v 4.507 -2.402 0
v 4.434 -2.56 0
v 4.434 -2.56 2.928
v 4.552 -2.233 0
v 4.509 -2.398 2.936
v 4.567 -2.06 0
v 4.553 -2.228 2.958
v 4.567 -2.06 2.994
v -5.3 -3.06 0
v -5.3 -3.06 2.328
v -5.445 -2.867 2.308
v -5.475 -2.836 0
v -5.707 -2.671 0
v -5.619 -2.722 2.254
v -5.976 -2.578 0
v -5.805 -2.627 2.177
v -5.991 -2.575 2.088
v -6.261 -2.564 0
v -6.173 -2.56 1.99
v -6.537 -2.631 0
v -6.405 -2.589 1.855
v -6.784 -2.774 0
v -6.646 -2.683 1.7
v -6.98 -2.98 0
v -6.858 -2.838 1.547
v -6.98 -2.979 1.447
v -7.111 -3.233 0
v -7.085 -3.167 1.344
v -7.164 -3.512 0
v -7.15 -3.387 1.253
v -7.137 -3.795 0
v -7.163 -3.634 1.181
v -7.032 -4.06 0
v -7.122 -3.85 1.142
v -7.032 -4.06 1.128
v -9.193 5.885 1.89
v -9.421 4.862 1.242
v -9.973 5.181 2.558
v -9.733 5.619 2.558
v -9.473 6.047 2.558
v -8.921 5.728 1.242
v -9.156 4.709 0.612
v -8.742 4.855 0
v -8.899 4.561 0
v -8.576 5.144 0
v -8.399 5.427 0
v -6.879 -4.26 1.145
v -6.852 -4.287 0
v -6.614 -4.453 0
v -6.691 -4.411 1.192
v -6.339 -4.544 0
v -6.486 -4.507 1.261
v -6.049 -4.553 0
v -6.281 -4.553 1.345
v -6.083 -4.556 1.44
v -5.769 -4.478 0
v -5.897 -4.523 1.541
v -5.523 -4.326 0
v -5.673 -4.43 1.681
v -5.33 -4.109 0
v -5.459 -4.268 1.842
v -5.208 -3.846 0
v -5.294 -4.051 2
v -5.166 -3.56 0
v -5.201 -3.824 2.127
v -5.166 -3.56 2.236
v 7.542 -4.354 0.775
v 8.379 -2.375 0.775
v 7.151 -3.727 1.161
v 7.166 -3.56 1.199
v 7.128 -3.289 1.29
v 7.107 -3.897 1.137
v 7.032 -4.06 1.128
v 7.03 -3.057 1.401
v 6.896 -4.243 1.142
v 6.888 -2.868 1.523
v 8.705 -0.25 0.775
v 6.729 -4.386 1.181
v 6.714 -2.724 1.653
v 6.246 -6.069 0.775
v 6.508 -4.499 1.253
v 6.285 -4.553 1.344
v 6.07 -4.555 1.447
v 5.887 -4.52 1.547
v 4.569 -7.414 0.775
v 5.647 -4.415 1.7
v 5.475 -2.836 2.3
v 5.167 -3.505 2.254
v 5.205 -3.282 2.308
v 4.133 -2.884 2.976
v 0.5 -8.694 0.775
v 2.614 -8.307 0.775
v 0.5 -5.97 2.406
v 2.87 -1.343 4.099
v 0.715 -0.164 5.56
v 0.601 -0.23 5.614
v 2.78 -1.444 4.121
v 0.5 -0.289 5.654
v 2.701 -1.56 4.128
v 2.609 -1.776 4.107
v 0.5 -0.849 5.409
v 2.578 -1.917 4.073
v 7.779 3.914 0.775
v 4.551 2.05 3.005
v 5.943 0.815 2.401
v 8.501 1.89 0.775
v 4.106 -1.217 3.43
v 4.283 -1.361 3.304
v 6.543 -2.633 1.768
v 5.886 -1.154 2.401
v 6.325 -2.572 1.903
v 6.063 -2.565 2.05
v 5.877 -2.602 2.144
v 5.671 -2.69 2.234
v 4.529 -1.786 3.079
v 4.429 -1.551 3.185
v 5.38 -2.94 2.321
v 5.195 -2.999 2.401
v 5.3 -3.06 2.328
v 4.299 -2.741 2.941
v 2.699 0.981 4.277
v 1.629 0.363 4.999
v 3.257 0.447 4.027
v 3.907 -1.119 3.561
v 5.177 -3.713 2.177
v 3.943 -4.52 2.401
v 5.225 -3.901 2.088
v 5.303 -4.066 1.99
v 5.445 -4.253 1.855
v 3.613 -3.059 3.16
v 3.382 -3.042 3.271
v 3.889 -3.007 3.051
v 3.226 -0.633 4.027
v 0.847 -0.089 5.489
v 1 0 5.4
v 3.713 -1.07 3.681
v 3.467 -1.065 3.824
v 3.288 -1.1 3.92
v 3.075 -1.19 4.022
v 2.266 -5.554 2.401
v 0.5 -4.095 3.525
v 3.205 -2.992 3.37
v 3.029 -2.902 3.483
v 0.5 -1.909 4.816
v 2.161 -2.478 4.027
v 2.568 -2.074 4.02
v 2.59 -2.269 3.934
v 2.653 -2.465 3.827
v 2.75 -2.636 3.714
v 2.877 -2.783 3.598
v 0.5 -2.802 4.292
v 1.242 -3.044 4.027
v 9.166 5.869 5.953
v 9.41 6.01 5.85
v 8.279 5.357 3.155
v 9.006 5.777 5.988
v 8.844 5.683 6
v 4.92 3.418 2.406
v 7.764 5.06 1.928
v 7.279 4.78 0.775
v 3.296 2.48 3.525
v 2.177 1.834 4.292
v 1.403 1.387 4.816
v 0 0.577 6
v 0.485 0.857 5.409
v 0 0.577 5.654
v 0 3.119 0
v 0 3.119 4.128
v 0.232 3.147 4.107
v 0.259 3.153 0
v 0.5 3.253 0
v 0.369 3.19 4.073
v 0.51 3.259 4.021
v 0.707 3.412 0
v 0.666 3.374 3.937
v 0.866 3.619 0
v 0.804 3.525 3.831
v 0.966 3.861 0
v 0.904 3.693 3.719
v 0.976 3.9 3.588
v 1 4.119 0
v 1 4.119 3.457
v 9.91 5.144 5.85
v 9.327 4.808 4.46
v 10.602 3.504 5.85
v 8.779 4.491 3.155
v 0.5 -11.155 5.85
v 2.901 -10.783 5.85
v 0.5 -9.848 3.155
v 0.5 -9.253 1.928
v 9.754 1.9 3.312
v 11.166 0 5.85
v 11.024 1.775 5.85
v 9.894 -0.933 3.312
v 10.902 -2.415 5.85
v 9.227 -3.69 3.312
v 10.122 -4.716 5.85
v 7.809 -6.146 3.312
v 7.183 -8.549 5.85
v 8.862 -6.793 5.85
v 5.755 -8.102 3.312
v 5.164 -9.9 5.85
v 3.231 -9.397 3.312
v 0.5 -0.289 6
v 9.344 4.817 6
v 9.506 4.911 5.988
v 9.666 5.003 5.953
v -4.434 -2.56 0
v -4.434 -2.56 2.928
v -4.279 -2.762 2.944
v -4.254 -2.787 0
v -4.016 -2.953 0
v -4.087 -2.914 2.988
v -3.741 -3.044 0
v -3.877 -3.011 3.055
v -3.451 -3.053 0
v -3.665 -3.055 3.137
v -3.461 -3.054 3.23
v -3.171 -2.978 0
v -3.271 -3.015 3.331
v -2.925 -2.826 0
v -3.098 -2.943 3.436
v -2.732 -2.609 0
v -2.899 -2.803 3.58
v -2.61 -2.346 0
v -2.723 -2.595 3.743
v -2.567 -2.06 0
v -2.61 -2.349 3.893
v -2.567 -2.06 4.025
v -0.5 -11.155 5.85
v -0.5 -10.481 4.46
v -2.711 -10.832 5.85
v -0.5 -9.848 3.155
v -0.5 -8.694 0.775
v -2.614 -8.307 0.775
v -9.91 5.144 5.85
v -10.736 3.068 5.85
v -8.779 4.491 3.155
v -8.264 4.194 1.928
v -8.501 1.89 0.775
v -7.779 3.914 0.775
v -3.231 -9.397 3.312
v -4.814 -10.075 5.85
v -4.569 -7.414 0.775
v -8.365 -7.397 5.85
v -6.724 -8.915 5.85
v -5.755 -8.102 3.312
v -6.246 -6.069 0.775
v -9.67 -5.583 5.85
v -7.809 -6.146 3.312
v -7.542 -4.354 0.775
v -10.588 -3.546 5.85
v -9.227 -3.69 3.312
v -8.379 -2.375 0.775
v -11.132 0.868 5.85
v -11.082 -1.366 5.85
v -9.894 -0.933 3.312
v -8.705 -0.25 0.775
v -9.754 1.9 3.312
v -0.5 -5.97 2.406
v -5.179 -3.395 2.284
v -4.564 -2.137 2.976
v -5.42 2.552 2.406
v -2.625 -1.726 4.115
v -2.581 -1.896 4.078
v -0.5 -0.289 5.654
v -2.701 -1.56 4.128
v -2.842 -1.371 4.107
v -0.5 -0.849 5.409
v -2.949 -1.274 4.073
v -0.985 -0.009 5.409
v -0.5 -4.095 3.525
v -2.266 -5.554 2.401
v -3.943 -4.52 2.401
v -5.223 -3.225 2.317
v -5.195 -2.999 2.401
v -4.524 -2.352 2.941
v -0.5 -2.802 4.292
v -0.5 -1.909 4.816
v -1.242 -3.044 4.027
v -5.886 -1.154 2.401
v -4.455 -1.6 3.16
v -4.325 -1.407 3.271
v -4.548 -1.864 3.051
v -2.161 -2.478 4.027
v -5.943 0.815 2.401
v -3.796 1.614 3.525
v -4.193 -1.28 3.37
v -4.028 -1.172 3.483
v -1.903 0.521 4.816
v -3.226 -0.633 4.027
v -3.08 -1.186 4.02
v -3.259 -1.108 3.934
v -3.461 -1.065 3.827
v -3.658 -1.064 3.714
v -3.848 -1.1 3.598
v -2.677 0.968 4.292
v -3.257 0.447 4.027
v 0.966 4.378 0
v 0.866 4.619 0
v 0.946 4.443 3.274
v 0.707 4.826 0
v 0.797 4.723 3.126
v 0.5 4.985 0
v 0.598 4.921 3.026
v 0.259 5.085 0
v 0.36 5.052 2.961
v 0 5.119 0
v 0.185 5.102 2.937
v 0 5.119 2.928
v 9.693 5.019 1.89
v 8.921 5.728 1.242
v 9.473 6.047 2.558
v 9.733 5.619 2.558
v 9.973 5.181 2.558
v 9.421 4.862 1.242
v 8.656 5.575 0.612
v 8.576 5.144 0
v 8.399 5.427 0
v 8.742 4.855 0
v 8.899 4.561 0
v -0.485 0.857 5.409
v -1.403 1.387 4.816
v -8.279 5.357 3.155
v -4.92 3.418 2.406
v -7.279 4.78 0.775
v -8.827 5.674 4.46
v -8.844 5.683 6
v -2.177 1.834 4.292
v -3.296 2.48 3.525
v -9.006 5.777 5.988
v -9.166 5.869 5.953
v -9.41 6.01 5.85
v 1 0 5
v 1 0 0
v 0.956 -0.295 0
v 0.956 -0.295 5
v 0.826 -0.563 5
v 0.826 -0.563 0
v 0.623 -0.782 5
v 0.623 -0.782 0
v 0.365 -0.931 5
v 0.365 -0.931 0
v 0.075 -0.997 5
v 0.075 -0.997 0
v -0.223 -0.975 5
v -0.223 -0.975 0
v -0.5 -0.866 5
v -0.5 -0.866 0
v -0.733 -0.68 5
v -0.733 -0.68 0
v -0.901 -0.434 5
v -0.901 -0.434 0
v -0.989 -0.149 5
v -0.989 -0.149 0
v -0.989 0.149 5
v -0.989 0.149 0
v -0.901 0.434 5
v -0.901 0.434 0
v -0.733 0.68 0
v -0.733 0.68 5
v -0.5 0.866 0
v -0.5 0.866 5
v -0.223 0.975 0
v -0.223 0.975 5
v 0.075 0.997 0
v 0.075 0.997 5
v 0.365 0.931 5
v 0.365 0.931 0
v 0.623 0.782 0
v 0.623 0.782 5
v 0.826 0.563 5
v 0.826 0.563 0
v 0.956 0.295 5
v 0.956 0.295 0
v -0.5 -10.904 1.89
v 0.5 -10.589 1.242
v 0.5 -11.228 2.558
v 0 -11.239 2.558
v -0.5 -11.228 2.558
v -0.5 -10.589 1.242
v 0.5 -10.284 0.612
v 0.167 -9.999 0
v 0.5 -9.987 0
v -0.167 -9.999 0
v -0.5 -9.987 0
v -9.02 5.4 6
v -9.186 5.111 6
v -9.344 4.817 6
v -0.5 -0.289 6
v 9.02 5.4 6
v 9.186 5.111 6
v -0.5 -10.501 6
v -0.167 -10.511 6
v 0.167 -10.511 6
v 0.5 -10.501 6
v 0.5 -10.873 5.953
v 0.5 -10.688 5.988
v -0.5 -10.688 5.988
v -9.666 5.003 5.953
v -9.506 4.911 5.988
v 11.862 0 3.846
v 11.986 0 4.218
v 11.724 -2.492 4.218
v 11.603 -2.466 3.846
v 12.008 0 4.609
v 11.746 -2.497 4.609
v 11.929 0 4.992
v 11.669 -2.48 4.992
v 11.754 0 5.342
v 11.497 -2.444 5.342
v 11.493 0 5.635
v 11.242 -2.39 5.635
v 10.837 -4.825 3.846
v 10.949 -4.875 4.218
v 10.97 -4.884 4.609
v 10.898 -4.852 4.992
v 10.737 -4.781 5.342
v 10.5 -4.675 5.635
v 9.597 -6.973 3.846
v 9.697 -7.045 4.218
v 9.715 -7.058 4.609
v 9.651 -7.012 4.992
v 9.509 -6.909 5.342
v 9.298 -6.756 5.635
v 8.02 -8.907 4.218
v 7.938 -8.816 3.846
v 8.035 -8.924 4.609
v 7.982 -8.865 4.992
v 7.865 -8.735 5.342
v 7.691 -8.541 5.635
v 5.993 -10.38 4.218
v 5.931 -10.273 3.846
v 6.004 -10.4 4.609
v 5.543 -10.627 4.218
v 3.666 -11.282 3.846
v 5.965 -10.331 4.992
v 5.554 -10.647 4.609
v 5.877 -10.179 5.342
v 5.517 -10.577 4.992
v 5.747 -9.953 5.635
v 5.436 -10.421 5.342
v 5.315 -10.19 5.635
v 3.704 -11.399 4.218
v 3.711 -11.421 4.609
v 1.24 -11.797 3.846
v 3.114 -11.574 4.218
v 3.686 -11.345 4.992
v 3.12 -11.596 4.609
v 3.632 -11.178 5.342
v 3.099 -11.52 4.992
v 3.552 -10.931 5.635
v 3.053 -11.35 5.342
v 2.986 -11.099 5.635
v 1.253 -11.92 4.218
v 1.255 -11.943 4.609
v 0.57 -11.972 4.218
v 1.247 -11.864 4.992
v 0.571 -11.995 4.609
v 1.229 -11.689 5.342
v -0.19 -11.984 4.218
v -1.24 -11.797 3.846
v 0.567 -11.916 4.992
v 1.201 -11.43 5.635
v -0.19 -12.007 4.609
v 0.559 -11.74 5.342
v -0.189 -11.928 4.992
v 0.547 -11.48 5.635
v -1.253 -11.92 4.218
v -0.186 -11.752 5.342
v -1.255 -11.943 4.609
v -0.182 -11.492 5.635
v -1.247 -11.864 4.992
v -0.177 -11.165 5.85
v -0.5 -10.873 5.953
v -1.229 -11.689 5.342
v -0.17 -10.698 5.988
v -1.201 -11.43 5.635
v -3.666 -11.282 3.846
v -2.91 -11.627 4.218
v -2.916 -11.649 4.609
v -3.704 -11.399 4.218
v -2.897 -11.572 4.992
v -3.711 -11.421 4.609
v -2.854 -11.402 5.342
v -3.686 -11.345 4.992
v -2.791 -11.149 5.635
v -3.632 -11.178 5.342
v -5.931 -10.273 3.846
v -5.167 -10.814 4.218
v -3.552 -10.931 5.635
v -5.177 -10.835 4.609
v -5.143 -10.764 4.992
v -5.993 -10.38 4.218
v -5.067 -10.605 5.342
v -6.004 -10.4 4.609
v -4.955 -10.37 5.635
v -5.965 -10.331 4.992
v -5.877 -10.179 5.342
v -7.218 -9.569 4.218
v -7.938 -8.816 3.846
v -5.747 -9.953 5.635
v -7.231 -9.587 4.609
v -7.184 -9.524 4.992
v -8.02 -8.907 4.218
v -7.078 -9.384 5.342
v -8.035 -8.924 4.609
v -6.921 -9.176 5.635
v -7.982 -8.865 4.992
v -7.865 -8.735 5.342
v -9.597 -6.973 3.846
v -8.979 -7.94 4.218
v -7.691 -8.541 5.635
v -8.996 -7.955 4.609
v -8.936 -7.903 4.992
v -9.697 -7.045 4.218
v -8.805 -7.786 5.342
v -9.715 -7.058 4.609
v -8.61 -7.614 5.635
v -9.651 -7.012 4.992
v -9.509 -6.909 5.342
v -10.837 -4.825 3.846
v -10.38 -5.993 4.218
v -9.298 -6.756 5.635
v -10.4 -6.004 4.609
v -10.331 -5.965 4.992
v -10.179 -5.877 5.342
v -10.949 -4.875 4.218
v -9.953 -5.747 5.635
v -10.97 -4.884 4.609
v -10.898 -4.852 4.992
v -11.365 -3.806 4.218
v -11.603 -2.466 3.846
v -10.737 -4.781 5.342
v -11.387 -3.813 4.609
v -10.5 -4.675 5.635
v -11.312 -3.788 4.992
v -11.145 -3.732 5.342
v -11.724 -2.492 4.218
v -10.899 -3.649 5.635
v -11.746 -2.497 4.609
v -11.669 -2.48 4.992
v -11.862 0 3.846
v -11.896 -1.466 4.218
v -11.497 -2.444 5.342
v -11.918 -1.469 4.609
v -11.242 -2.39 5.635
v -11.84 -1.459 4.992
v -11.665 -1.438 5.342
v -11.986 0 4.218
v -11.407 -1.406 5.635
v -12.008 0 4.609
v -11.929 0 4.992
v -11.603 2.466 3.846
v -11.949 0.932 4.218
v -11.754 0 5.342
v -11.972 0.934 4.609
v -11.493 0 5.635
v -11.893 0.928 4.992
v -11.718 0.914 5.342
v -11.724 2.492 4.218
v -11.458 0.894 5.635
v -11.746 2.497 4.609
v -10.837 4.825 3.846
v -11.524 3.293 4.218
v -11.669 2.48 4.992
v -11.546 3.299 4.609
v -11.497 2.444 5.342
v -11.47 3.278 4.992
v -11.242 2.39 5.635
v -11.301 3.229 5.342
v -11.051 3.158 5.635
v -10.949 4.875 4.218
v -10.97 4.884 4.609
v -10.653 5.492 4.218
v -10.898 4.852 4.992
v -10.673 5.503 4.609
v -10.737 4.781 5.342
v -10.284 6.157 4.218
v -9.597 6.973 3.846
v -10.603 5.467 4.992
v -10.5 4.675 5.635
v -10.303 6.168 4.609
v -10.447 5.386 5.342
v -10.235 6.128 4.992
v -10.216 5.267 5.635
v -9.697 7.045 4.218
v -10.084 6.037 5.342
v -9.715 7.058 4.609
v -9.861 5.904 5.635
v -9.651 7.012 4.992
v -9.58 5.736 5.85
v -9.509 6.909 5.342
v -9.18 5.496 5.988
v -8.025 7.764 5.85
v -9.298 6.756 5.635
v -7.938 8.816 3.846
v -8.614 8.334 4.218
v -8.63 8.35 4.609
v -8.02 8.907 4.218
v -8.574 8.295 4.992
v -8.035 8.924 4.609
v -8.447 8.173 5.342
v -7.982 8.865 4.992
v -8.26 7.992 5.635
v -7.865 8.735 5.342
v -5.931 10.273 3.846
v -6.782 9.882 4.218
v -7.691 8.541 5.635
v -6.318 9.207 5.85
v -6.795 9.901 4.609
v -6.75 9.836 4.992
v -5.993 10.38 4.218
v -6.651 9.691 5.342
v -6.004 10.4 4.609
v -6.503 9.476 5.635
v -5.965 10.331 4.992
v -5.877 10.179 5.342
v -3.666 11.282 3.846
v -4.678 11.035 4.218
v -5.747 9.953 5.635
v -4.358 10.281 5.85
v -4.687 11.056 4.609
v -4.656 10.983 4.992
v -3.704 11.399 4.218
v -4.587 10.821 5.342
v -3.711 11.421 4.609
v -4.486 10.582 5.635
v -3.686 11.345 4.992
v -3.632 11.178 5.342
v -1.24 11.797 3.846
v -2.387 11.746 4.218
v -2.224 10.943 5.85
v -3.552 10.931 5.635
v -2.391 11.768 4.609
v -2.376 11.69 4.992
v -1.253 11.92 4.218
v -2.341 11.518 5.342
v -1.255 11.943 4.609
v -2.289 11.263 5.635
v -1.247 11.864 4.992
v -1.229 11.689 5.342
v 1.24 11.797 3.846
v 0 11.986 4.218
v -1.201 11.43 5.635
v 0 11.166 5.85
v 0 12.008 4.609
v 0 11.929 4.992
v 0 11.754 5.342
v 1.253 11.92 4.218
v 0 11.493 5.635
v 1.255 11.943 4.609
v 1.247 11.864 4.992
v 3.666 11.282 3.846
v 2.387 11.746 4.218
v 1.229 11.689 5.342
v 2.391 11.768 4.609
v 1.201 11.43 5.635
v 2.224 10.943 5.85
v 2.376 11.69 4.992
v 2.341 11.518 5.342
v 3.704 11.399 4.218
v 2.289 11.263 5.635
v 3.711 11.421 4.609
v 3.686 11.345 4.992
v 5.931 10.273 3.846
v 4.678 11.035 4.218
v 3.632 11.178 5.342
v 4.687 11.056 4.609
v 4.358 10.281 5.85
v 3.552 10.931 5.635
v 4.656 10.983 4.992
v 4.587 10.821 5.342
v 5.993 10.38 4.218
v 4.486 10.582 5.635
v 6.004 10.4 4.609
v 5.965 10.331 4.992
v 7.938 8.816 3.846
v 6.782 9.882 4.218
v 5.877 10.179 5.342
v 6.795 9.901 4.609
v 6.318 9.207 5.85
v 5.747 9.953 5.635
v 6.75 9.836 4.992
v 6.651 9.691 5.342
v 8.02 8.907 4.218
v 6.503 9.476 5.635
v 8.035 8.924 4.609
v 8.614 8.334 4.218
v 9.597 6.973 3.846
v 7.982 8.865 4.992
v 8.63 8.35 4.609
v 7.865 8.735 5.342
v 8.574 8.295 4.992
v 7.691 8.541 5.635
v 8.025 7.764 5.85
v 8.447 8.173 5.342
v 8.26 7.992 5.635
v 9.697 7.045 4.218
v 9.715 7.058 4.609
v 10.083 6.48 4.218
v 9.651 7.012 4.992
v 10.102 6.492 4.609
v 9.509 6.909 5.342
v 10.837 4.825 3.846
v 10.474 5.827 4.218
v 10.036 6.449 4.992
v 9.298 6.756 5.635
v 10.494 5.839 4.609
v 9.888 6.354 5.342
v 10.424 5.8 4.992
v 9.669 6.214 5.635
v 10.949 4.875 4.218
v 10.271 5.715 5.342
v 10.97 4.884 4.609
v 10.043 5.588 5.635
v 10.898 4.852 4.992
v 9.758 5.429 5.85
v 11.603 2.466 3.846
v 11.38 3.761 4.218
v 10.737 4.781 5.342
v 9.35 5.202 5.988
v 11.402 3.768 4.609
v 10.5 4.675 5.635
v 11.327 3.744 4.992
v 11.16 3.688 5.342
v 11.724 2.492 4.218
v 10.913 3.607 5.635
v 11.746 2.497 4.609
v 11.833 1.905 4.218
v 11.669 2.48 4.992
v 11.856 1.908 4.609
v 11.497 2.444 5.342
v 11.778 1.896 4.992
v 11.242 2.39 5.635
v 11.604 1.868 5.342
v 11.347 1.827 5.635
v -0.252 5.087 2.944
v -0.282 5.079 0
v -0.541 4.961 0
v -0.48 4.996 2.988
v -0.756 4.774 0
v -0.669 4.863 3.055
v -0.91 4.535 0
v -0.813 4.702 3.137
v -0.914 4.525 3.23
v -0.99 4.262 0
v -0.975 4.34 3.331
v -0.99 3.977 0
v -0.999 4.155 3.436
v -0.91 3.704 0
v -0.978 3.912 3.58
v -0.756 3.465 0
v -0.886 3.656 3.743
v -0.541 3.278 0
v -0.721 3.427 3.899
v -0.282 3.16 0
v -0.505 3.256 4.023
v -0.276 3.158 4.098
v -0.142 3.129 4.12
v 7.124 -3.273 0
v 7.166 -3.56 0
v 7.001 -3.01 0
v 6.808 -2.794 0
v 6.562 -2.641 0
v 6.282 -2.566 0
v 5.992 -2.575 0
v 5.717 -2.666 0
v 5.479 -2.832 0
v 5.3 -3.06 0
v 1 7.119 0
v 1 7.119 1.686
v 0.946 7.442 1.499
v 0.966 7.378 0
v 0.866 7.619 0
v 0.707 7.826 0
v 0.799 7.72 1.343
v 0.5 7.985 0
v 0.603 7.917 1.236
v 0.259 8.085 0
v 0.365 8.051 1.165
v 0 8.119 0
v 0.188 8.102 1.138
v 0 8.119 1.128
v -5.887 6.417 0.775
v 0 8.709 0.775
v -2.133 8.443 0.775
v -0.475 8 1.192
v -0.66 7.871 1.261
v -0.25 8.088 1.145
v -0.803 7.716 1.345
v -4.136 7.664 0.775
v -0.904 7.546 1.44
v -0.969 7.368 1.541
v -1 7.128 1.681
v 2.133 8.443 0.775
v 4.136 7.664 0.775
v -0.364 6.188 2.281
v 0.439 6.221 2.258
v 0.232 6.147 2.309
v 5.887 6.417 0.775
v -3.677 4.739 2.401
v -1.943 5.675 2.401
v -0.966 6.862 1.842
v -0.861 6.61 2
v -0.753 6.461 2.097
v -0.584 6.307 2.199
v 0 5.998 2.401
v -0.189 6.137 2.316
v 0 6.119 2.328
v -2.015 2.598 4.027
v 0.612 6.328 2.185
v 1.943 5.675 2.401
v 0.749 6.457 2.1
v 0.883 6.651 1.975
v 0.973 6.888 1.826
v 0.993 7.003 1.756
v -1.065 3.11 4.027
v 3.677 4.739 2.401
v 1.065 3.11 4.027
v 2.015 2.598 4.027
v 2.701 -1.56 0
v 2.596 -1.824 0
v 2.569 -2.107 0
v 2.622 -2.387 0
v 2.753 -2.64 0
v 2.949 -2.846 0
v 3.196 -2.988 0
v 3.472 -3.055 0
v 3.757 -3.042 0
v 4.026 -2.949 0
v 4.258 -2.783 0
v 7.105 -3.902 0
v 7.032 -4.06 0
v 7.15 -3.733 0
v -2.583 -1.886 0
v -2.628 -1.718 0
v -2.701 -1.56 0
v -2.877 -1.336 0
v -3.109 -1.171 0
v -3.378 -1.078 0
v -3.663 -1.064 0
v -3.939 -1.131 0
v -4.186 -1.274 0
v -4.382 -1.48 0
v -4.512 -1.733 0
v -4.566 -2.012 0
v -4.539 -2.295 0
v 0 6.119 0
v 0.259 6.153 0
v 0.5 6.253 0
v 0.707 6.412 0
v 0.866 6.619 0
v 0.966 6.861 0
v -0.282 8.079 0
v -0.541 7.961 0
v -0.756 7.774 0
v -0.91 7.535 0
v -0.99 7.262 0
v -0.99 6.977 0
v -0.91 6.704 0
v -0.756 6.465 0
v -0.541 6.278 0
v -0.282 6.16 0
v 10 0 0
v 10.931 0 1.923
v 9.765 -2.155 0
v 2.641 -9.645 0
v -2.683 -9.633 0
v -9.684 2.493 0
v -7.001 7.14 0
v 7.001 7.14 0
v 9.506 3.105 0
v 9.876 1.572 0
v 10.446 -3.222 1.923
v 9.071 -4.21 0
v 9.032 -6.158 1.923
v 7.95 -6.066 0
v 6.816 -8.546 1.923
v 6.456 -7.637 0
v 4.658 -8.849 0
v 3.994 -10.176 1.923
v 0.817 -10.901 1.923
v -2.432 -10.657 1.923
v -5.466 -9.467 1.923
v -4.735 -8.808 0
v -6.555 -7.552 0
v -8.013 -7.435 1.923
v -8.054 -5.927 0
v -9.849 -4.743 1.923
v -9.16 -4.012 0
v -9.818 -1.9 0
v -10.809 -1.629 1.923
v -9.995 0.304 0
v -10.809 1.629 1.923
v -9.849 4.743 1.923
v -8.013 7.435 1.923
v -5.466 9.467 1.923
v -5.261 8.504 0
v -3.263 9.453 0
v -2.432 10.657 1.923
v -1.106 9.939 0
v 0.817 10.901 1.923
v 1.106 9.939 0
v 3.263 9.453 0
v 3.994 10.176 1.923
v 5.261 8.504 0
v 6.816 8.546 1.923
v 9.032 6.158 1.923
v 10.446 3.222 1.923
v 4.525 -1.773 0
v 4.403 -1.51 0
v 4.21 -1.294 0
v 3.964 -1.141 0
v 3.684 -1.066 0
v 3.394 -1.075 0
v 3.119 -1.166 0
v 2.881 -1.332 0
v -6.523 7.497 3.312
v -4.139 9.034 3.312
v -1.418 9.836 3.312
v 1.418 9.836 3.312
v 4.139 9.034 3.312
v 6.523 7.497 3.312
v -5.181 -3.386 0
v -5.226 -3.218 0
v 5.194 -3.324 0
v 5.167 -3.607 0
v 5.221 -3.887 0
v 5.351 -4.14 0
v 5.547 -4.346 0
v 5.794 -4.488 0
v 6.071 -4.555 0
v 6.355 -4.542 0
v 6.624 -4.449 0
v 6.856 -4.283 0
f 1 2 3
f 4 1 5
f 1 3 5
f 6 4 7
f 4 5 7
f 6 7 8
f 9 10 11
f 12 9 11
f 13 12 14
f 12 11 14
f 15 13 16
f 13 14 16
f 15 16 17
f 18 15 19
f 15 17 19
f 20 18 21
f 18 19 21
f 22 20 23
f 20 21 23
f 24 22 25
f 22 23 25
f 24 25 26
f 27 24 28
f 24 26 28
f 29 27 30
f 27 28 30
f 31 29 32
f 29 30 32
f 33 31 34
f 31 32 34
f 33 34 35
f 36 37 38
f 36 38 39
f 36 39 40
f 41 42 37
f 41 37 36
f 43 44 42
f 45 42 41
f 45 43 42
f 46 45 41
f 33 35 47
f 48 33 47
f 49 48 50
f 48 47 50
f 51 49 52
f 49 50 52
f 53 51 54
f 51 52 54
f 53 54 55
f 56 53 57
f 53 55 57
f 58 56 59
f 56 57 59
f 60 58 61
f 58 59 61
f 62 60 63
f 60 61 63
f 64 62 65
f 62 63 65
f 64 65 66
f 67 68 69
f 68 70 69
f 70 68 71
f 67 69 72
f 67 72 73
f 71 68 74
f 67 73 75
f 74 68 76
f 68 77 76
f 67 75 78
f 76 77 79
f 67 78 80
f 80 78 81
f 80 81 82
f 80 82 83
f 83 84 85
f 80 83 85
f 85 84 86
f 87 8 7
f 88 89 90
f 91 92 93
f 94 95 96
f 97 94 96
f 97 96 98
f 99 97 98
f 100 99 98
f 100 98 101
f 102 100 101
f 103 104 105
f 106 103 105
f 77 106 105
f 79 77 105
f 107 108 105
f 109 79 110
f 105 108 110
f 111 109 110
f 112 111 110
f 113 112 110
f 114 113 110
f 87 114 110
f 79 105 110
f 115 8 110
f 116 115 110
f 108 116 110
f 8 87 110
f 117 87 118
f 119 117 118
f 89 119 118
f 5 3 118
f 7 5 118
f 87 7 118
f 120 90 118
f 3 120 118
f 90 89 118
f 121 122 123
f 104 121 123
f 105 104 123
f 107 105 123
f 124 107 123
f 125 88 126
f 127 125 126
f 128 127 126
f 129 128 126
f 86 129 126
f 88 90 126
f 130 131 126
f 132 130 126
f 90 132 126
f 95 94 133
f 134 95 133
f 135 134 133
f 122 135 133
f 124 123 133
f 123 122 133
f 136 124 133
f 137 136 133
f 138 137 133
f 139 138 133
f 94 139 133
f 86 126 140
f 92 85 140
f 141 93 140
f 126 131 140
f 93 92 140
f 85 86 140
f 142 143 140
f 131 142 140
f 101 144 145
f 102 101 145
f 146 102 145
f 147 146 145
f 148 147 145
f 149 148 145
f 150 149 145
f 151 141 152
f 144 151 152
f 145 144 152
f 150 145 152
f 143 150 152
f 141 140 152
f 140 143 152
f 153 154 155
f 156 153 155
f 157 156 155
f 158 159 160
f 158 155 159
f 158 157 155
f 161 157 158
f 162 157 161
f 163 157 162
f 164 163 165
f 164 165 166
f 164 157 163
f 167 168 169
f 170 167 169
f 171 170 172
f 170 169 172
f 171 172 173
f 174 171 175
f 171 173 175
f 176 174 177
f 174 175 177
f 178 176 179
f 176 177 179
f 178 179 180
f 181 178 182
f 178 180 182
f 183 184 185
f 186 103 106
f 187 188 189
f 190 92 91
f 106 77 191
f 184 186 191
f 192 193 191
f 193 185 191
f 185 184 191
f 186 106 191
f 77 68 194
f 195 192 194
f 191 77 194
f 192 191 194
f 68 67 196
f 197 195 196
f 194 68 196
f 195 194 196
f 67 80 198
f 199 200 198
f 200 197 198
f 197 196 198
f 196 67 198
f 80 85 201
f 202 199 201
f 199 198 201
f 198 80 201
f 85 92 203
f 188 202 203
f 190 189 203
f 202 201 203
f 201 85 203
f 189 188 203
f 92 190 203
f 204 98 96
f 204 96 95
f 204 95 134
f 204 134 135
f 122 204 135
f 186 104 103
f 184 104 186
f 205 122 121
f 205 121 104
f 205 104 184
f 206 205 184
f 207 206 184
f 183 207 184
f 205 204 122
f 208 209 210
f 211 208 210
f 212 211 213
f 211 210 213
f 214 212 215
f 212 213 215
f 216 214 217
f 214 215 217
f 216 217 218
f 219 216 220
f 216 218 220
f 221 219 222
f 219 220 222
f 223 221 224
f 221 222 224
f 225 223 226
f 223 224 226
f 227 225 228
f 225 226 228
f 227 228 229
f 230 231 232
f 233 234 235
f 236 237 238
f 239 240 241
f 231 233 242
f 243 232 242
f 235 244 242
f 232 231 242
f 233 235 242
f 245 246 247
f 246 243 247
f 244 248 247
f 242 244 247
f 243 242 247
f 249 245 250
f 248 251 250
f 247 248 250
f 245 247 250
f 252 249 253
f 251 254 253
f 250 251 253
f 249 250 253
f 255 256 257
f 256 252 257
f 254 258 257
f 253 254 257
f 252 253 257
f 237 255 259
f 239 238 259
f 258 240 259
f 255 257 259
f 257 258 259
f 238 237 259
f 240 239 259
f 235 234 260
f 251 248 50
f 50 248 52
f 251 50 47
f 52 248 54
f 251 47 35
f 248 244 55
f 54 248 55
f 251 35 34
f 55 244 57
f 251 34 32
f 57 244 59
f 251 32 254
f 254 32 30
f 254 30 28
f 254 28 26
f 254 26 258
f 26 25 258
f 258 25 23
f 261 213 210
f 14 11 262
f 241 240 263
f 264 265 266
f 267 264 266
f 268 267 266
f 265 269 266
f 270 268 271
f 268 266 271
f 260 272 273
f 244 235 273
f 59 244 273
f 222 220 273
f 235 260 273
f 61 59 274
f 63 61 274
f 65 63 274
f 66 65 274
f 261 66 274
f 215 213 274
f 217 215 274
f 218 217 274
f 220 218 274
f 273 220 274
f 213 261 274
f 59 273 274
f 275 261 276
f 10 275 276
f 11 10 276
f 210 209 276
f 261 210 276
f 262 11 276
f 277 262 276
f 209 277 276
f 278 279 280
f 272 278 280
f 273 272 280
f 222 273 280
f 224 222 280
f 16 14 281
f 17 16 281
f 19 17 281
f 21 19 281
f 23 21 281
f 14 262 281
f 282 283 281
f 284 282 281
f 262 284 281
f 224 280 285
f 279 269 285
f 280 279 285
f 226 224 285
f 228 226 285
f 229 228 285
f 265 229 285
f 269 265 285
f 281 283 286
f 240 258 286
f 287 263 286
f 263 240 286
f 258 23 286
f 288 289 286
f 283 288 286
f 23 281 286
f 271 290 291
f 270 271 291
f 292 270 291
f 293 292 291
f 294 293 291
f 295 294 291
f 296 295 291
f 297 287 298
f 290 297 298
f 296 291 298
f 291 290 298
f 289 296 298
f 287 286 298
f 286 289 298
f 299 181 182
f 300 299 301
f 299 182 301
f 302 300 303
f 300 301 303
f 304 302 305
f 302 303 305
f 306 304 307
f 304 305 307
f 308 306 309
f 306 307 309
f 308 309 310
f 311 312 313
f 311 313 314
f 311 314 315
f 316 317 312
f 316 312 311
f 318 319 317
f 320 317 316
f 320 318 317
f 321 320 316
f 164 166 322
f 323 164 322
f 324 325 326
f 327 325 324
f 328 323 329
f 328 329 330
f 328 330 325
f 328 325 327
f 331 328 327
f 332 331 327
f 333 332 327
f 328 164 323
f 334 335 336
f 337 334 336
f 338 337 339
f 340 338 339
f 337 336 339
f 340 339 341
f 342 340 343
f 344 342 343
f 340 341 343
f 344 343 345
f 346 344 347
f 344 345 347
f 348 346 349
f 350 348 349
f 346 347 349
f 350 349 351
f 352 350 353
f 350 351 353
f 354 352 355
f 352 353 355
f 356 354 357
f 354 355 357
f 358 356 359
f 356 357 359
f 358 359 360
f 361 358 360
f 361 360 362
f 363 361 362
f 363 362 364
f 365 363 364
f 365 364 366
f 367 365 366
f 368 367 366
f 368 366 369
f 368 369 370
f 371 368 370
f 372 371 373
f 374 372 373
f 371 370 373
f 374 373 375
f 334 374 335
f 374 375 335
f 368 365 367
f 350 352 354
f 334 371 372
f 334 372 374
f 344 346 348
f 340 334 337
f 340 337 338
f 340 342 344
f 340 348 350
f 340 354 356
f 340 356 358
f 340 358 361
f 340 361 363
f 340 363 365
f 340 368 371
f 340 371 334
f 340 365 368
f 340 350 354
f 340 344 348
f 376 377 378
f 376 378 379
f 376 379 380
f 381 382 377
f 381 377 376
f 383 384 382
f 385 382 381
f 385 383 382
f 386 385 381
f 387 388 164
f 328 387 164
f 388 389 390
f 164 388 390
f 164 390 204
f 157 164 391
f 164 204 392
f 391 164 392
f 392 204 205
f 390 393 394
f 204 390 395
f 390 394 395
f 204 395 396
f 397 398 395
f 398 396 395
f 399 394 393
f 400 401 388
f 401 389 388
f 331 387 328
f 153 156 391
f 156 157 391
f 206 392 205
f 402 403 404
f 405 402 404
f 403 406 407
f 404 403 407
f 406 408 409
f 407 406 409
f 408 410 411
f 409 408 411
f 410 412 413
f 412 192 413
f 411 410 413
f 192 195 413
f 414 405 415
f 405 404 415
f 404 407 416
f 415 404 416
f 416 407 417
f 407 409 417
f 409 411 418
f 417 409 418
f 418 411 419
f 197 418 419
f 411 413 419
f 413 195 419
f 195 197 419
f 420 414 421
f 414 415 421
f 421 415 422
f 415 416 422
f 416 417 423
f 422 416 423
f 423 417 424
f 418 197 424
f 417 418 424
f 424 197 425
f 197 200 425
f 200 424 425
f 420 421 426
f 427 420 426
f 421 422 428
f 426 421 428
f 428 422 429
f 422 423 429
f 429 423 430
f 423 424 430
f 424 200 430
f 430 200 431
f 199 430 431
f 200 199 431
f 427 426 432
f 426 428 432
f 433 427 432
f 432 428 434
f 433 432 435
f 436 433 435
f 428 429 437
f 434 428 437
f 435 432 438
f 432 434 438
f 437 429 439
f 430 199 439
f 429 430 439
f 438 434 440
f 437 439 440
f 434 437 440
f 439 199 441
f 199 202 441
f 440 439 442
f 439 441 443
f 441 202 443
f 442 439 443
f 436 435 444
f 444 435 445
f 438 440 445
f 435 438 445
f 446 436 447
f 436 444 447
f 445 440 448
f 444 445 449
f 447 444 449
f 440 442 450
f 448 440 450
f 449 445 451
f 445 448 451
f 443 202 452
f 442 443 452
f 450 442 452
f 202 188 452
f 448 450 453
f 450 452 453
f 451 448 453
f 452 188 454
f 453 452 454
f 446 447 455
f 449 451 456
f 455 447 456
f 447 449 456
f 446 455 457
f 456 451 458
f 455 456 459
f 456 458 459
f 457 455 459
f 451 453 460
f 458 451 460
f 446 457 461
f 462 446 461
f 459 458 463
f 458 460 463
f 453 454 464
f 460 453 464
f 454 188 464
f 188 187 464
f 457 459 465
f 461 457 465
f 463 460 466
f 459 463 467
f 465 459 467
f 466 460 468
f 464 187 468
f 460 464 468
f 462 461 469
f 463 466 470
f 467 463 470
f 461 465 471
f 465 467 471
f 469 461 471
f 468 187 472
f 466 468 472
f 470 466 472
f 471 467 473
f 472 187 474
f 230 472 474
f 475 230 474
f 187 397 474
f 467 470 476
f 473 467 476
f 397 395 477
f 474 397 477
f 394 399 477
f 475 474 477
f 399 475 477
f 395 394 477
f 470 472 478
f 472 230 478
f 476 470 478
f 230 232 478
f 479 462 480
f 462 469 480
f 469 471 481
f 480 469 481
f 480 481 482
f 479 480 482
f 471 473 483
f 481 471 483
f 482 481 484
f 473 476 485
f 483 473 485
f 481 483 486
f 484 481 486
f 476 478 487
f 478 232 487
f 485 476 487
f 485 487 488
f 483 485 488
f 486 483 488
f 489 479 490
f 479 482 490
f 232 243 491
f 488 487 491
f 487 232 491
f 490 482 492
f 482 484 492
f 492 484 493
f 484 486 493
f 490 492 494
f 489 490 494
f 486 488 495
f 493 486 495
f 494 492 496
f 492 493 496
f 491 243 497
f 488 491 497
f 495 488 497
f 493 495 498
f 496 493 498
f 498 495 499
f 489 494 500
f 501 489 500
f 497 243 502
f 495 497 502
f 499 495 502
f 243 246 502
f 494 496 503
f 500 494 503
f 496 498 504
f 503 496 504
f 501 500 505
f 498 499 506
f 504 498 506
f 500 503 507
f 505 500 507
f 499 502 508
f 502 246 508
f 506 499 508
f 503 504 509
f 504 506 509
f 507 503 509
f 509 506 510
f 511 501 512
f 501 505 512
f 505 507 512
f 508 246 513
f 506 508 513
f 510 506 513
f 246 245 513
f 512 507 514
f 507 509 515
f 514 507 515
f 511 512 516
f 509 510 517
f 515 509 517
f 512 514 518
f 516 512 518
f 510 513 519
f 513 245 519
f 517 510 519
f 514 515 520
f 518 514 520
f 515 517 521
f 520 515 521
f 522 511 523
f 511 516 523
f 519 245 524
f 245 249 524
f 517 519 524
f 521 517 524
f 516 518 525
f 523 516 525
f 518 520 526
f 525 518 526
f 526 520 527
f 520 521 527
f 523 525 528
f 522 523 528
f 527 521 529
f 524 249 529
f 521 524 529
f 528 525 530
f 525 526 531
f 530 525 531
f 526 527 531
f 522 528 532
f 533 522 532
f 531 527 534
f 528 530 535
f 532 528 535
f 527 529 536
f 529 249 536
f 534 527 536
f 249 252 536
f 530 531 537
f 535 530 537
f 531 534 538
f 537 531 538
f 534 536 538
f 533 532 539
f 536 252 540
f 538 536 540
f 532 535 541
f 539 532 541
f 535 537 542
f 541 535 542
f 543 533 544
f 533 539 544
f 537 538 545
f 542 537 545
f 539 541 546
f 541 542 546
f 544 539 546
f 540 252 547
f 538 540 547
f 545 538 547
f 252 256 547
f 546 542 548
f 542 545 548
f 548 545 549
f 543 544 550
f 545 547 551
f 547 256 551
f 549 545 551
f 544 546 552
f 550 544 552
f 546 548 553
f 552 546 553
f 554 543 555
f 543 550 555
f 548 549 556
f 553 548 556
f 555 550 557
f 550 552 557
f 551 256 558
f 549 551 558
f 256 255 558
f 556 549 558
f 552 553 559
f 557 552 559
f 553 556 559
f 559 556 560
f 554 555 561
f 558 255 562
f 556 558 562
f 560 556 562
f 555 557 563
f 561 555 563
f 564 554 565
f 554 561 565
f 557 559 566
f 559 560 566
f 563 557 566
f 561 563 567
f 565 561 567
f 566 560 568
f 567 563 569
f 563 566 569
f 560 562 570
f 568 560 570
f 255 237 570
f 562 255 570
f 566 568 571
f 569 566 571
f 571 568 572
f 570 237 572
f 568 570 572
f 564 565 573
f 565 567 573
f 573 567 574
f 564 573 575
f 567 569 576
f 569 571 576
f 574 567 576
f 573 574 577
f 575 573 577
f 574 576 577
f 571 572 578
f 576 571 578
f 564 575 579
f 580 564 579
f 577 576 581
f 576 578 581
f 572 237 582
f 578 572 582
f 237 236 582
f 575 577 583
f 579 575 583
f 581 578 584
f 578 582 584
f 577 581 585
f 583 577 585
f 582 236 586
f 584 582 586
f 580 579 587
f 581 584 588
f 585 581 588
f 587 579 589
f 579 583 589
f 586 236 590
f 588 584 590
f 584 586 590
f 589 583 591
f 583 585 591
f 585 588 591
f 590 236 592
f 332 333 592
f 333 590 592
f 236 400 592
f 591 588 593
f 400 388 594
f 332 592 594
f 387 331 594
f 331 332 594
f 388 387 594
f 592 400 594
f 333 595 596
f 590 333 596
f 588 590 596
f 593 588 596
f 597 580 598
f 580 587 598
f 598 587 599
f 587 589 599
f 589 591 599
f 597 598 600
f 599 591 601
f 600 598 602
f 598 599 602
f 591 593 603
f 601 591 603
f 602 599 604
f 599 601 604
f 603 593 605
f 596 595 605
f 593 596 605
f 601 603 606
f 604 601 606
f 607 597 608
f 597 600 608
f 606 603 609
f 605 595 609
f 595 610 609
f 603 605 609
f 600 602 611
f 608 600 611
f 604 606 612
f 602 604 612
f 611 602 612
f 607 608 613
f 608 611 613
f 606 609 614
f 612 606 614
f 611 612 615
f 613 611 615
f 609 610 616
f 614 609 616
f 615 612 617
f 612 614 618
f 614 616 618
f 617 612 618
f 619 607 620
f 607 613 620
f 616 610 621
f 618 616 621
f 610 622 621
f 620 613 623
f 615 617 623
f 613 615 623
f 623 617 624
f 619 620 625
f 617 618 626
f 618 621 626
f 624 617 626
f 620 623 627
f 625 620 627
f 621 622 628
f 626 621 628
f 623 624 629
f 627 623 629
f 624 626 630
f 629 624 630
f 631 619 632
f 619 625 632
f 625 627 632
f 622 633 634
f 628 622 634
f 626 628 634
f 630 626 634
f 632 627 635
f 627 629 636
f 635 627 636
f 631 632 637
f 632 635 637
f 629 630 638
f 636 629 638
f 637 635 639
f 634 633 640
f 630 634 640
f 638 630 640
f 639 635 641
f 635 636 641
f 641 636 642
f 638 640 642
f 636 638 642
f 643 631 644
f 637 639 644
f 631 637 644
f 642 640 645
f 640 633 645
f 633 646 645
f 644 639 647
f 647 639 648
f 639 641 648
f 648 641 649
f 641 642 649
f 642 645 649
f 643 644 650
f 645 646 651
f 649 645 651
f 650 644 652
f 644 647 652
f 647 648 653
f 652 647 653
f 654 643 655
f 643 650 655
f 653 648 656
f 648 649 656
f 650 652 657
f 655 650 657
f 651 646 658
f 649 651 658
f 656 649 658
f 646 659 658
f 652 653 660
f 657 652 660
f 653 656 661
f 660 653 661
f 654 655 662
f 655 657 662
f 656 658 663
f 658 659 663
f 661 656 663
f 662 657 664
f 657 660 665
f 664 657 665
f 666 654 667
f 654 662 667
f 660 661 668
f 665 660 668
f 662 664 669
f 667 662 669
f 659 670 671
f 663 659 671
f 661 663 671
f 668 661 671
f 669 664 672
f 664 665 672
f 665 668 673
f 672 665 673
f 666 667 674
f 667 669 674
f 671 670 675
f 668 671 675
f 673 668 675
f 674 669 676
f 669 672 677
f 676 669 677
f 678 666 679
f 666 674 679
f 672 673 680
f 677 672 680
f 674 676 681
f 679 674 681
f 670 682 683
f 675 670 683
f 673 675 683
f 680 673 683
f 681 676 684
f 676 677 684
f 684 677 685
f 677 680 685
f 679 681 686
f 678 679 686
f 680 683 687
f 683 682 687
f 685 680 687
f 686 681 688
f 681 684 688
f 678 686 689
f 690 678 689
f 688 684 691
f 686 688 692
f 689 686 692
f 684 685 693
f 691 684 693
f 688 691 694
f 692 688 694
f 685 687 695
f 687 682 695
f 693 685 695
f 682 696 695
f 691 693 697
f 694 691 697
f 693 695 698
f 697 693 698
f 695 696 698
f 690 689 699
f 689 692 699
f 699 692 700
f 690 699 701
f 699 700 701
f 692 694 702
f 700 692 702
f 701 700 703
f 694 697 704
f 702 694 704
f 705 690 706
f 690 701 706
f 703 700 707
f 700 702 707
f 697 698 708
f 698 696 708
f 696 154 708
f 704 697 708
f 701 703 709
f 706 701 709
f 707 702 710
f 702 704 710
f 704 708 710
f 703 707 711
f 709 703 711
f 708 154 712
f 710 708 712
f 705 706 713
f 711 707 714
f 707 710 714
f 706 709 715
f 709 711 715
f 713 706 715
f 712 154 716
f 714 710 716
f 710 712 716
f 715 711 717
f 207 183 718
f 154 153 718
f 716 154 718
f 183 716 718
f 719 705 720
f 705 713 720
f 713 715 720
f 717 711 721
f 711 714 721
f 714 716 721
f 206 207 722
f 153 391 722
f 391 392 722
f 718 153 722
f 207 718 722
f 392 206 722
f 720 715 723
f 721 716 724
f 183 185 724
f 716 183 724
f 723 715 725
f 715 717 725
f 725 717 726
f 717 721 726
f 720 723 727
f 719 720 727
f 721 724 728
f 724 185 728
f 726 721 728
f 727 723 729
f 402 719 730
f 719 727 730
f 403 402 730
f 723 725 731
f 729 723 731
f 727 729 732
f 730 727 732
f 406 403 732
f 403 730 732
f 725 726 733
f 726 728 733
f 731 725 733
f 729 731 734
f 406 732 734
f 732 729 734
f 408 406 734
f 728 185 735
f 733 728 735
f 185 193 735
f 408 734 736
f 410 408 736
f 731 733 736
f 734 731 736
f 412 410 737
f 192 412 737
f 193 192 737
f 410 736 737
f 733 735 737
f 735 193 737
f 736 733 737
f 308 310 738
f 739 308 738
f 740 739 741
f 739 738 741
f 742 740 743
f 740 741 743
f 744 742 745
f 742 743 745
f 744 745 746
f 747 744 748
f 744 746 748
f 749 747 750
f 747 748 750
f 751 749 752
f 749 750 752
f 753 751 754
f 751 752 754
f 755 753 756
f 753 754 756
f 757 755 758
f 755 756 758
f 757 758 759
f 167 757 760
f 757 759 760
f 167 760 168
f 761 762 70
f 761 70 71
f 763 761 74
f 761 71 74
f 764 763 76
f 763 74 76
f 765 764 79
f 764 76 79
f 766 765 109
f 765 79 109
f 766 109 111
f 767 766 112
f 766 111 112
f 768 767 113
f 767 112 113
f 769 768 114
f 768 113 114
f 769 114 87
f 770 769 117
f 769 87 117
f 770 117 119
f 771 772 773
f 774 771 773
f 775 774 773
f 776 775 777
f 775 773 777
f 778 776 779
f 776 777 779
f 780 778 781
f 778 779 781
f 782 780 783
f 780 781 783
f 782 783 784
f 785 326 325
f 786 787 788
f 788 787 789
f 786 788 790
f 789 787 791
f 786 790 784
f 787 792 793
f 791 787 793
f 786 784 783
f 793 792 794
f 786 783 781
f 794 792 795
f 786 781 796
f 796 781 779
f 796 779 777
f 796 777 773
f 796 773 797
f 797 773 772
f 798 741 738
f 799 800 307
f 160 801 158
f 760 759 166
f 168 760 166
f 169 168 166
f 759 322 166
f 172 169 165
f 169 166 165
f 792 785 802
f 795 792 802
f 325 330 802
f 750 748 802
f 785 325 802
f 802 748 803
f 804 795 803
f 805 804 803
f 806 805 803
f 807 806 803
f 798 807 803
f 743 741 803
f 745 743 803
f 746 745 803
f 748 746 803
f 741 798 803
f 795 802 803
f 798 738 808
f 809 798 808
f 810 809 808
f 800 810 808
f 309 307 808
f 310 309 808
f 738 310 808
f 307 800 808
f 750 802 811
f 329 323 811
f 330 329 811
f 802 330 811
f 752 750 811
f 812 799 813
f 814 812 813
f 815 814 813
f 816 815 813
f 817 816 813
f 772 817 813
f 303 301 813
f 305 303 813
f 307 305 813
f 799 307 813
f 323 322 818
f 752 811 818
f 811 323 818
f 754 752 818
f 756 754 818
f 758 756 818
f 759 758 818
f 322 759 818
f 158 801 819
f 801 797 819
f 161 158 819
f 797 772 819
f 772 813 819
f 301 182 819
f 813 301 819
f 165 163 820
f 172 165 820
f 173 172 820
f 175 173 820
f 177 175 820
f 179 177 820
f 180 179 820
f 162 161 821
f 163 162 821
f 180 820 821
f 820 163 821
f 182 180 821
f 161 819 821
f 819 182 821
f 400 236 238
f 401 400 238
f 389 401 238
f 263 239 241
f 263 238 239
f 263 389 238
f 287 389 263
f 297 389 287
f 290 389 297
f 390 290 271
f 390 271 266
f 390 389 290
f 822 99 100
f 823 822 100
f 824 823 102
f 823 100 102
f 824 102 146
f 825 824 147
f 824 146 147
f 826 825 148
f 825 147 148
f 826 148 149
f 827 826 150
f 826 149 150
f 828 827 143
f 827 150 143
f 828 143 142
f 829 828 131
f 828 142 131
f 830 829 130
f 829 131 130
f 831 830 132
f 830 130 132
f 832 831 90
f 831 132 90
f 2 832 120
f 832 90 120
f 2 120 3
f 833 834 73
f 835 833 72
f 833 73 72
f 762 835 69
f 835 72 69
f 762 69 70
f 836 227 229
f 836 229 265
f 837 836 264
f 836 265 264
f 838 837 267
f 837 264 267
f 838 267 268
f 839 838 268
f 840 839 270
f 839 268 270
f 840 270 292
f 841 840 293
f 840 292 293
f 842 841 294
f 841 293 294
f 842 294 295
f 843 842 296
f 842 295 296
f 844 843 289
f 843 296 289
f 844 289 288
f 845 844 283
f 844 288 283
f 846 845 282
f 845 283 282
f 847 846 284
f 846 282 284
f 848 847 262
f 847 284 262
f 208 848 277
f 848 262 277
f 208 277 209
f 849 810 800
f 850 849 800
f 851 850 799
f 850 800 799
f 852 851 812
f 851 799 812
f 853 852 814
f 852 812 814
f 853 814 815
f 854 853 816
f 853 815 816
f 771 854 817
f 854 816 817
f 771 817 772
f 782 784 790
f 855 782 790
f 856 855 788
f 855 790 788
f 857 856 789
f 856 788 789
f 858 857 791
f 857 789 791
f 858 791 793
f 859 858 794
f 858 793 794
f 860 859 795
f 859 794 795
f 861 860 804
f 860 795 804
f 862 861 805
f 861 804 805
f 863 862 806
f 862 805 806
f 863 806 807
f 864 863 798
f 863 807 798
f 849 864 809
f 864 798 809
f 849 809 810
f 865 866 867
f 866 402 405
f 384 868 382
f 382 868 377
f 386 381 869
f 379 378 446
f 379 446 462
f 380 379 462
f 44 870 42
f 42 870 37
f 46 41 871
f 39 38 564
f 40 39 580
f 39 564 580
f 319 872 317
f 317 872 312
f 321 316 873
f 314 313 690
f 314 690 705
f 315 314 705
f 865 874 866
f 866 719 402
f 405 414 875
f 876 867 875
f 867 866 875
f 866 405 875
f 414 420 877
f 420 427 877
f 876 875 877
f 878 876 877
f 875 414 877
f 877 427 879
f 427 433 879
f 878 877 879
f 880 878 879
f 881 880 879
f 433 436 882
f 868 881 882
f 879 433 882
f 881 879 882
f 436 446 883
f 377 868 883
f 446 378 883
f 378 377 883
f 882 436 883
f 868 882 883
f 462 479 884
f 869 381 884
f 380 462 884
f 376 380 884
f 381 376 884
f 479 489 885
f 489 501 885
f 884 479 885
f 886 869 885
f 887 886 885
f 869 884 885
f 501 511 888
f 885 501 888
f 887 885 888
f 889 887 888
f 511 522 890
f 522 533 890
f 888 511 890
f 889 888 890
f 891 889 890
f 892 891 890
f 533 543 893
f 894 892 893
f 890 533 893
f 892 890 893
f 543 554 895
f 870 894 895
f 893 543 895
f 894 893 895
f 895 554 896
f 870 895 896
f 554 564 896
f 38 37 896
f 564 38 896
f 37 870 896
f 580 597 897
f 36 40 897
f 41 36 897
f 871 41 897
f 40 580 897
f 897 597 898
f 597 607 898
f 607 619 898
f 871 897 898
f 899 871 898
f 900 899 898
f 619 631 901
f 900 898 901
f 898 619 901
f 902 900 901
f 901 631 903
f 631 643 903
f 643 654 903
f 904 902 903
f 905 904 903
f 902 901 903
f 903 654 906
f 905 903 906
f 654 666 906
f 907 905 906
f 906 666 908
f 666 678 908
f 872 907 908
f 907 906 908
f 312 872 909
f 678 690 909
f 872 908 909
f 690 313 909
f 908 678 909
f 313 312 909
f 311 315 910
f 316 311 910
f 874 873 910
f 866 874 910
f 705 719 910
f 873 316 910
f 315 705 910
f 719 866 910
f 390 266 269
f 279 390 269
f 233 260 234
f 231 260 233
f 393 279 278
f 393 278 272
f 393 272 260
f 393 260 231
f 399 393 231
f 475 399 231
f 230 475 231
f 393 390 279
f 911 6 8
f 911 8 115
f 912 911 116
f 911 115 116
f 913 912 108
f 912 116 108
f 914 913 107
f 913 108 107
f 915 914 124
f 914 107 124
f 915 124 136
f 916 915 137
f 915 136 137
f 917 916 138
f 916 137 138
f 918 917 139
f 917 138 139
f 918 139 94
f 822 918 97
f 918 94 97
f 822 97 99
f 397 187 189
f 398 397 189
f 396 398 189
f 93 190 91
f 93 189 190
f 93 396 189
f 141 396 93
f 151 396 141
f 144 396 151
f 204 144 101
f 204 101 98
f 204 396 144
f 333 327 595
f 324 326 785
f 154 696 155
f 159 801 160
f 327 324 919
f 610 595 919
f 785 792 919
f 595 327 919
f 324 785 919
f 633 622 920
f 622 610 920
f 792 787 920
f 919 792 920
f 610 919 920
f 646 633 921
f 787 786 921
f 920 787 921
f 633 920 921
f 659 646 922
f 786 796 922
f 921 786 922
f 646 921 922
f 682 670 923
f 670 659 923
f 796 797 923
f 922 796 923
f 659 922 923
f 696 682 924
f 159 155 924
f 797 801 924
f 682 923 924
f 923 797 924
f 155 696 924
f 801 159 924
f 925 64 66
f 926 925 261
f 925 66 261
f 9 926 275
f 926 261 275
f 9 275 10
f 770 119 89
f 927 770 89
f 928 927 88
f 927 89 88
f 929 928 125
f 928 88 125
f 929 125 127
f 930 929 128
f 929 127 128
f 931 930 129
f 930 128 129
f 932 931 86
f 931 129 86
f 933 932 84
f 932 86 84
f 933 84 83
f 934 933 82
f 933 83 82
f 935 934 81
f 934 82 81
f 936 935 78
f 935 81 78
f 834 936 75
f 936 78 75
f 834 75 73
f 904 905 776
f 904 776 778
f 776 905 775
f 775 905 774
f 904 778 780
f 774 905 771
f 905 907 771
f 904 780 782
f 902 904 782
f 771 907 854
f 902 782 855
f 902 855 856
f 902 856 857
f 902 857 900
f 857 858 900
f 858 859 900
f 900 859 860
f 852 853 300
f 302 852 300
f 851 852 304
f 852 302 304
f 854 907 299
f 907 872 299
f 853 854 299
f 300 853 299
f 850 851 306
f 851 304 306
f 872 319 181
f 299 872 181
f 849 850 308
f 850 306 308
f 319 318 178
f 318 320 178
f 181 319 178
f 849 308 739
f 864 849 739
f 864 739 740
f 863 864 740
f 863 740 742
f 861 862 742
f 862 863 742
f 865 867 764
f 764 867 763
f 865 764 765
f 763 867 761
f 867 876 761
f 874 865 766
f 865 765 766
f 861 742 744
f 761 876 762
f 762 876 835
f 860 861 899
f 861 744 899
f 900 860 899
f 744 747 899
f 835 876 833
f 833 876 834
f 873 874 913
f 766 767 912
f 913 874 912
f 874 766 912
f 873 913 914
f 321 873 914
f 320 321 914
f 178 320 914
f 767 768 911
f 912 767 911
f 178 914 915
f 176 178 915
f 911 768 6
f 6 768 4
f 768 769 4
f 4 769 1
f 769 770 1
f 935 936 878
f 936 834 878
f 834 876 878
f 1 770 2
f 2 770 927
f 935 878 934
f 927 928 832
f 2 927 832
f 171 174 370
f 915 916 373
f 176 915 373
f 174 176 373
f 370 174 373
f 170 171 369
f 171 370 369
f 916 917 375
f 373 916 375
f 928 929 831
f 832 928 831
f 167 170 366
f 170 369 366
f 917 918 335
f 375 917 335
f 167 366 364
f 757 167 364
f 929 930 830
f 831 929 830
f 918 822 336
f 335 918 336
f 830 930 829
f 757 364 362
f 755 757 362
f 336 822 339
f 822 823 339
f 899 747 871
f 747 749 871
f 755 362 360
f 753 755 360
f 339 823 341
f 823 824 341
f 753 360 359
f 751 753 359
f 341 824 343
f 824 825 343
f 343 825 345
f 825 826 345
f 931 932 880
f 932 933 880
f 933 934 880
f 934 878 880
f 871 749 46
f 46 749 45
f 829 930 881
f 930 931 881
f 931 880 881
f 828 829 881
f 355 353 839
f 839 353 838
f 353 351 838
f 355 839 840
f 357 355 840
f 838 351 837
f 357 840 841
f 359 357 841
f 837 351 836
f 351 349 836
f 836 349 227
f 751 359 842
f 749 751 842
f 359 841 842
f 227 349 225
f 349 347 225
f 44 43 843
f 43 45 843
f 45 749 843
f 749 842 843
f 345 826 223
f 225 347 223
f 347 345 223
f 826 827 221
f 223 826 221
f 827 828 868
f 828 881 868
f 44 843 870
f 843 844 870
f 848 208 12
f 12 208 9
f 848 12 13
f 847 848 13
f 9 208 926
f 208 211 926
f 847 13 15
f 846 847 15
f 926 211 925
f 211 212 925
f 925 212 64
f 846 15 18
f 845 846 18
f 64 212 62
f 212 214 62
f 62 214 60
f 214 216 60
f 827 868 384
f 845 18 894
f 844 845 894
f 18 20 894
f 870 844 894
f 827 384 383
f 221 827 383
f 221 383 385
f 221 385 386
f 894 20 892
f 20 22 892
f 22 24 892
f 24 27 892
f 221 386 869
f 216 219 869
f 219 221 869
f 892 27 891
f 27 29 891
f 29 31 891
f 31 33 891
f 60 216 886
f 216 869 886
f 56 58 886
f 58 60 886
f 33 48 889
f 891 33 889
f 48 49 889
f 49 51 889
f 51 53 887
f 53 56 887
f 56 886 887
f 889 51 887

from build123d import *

# Parameters (mm, degrees)
F3_DEPTH = 6
F5_DEPTH = 6.0010001
F6_R     = 1
F7_DEPTH = 5


# Not quite as in the source:
# - a fillet or chamfer that OpenCascade refuses, or shapes differently, is made with other operations: its cross-section is extruded or revolved along the edge and cut away or added


with BuildPart() as f1:
    # F0 (on Front) → F1 (revolve)
    with BuildSketch(Plane.XZ):
        Polygon((0, 0), (10, 0), (8.7085954955, 0.7748427027), (0, 6), align=None)
        Polygon((8.7085954955, 0.7748427027), (10, 0), (12.905373238, 6), (11.2387675248, 6), align=None)
    revolve(axis=Axis((0, 0, 3), (0, 0, -1)))

    # F2 (on face) → F3 (join, through all)
    with BuildSketch(Plane.XY.offset(6)):
        with BuildLine():
            Line((0, -11.2387675248), (0, 0))
            Line((0, 0), (-9.7330581837, 5.6193837624))
            ThreePointArc((-9.7330581837, 5.6193837624), (-9.8556796151, 5.401432662), (-9.9734212913, 5.1808071981))
            Line((-9.9734212913, 5.1808071981), (-0.5, -0.2886751346))
            Line((-0.5, -0.2886751346), (-0.5, -11.2276397999))
            ThreePointArc((-0.5, -11.2276397999), (-0.2500619055, -11.2359852492), (0, -11.2387675248))
        make_face()
        with BuildLine():
            Line((9.7330581837, 5.6193837624), (0, 0))
            Line((0, 0), (0, -11.2387675248))
            ThreePointArc((0, -11.2387675248), (0.2500619055, -11.2359852492), (0.5, -11.2276397999))
            Line((0.5, -11.2276397999), (0.5, -0.2886751346))
            Line((0.5, -0.2886751346), (9.9734212913, 5.1808071981))
            ThreePointArc((9.9734212913, 5.1808071981), (9.8556796151, 5.401432662), (9.7330581837, 5.6193837624))
        make_face()
        with BuildLine():
            Line((-9.7330581837, 5.6193837624), (0, 0))
            Line((0, 0), (9.7330581837, 5.6193837624))
            ThreePointArc((9.7330581837, 5.6193837624), (9.6056177096, 5.8345525873), (9.4734212913, 6.0468326019))
            Line((9.4734212913, 6.0468326019), (0, 0.5773502692))
            Line((0, 0.5773502692), (-9.4734212913, 6.0468326019))
            ThreePointArc((-9.4734212913, 6.0468326019), (-9.6056177096, 5.8345525873), (-9.7330581837, 5.6193837624))
        make_face()
    extrude(amount=-F3_DEPTH)

    # F4 (on face) → F5 (cut, through all)
    with BuildSketch(Plane.XY.offset(6)):
        with BuildLine():
            ThreePointArc((7.1655671975, -3.5596918812), (6.4243862426, -2.5937660549), (5.2995417938, -3.0596918812))
            Line((5.2995417938, -3.0596918812), (7.0315926013, -4.0596918812))
            ThreePointArc((7.0315926013, -4.0596918812), (7.1314930238, -3.8185109263), (7.1655671975, -3.5596918812))
        make_face()
        with BuildLine():
            Line((7.0315926013, -4.0596918812), (5.2995417938, -3.0596918812))
            ThreePointArc((5.2995417938, -3.0596918812), (5.6655671975, -4.425717285), (7.0315926013, -4.0596918812))
        make_face()
        with BuildLine():
            ThreePointArc((4.5674909862, -2.0596918812), (3.8263100313, -1.0937660549), (2.7014655824, -1.5596918812))
            Line((2.7014655824, -1.5596918812), (4.43351639, -2.5596918812))
            ThreePointArc((4.43351639, -2.5596918812), (4.5334168125, -2.3185109263), (4.5674909862, -2.0596918812))
        make_face()
        with BuildLine():
            Line((4.43351639, -2.5596918812), (2.7014655824, -1.5596918812))
            ThreePointArc((2.7014655824, -1.5596918812), (3.0674909862, -2.925717285), (4.43351639, -2.5596918812))
        make_face()
        with BuildLine():
            ThreePointArc((-5.1655671975, -3.5596918812), (-5.1996413713, -3.3008728361), (-5.2995417938, -3.0596918812))
            Line((-5.2995417938, -3.0596918812), (-7.0315926013, -4.0596918812))
            ThreePointArc((-7.0315926013, -4.0596918812), (-5.9067481524, -4.5256177075), (-5.1655671975, -3.5596918812))
        make_face()
        with BuildLine():
            Line((-7.0315926013, -4.0596918812), (-5.2995417938, -3.0596918812))
            ThreePointArc((-5.2995417938, -3.0596918812), (-6.6655671975, -2.6936664774), (-7.0315926013, -4.0596918812))
        make_face()
        with BuildLine():
            ThreePointArc((-2.5674909862, -2.0596918812), (-2.6015651599, -1.8008728361), (-2.7014655824, -1.5596918812))
            Line((-2.7014655824, -1.5596918812), (-4.43351639, -2.5596918812))
            ThreePointArc((-4.43351639, -2.5596918812), (-3.3086719411, -3.0256177075), (-2.5674909862, -2.0596918812))
        make_face()
        with BuildLine():
            Line((-4.43351639, -2.5596918812), (-2.7014655824, -1.5596918812))
            ThreePointArc((-2.7014655824, -1.5596918812), (-4.0674909862, -1.1936664774), (-4.43351639, -2.5596918812))
        make_face()
        with BuildLine():
            ThreePointArc((0, 8.1193837624), (-1, 7.1193837624), (0, 6.1193837624))
            Line((0, 6.1193837624), (0, 8.1193837624))
        make_face()
        with BuildLine():
            Line((0, 8.1193837624), (0, 6.1193837624))
            ThreePointArc((0, 6.1193837624), (0.7071067812, 6.4122769812), (1, 7.1193837624))
            ThreePointArc((1, 7.1193837624), (0.7071067812, 7.8264905436), (0, 8.1193837624))
        make_face()
        with BuildLine():
            ThreePointArc((0, 5.1193837624), (-1, 4.1193837624), (0, 3.1193837624))
            Line((0, 3.1193837624), (0, 5.1193837624))
        make_face()
        with BuildLine():
            Line((0, 5.1193837624), (0, 3.1193837624))
            ThreePointArc((0, 3.1193837624), (0.7071067812, 3.4122769812), (1, 4.1193837624))
            ThreePointArc((1, 4.1193837624), (0.7071067812, 4.8264905436), (0, 5.1193837624))
        make_face()
    extrude(amount=-F5_DEPTH, mode=Mode.SUBTRACT)

    # F6 (on face) → F7 (cut)
    with BuildSketch(Plane(origin=(0, 0, 0), x_dir=(1, 0, 0), z_dir=(0, 0, -1))):
        Circle(F6_R)
    extrude(amount=-F7_DEPTH, mode=Mode.SUBTRACT)

    # F8: fillet of radius 1.5 on 1 edges, made by hand

    # F8_s1 → F8_t2 (revolve, cut)
    with BuildSketch(Plane.XZ):
        with BuildLine():
            ThreePointArc((11.8624735894, 3.8462671131), (11.7833686143, 5.2966808237), (10.5124242153, 6))
            Line((10.5124242153, 6), (12.905373238, 6))
            Line((12.905373238, 6), (11.8624735894, 3.8462671131))
        make_face()
    revolve(axis=Axis((0, 0, 6), (0, 0, -1)), mode=Mode.SUBTRACT)

    # F0 (on Front) → F9 (revolve, cut)
    with BuildSketch(Plane.XZ):
        Polygon((12.905373238, 6), (10, 0), (13.7833622578, 0), (16.6887354958, 6), align=None)
    revolve(axis=Axis((0, 0, 3), (0, 0, -1)), mode=Mode.SUBTRACT)


solid = f1.part
